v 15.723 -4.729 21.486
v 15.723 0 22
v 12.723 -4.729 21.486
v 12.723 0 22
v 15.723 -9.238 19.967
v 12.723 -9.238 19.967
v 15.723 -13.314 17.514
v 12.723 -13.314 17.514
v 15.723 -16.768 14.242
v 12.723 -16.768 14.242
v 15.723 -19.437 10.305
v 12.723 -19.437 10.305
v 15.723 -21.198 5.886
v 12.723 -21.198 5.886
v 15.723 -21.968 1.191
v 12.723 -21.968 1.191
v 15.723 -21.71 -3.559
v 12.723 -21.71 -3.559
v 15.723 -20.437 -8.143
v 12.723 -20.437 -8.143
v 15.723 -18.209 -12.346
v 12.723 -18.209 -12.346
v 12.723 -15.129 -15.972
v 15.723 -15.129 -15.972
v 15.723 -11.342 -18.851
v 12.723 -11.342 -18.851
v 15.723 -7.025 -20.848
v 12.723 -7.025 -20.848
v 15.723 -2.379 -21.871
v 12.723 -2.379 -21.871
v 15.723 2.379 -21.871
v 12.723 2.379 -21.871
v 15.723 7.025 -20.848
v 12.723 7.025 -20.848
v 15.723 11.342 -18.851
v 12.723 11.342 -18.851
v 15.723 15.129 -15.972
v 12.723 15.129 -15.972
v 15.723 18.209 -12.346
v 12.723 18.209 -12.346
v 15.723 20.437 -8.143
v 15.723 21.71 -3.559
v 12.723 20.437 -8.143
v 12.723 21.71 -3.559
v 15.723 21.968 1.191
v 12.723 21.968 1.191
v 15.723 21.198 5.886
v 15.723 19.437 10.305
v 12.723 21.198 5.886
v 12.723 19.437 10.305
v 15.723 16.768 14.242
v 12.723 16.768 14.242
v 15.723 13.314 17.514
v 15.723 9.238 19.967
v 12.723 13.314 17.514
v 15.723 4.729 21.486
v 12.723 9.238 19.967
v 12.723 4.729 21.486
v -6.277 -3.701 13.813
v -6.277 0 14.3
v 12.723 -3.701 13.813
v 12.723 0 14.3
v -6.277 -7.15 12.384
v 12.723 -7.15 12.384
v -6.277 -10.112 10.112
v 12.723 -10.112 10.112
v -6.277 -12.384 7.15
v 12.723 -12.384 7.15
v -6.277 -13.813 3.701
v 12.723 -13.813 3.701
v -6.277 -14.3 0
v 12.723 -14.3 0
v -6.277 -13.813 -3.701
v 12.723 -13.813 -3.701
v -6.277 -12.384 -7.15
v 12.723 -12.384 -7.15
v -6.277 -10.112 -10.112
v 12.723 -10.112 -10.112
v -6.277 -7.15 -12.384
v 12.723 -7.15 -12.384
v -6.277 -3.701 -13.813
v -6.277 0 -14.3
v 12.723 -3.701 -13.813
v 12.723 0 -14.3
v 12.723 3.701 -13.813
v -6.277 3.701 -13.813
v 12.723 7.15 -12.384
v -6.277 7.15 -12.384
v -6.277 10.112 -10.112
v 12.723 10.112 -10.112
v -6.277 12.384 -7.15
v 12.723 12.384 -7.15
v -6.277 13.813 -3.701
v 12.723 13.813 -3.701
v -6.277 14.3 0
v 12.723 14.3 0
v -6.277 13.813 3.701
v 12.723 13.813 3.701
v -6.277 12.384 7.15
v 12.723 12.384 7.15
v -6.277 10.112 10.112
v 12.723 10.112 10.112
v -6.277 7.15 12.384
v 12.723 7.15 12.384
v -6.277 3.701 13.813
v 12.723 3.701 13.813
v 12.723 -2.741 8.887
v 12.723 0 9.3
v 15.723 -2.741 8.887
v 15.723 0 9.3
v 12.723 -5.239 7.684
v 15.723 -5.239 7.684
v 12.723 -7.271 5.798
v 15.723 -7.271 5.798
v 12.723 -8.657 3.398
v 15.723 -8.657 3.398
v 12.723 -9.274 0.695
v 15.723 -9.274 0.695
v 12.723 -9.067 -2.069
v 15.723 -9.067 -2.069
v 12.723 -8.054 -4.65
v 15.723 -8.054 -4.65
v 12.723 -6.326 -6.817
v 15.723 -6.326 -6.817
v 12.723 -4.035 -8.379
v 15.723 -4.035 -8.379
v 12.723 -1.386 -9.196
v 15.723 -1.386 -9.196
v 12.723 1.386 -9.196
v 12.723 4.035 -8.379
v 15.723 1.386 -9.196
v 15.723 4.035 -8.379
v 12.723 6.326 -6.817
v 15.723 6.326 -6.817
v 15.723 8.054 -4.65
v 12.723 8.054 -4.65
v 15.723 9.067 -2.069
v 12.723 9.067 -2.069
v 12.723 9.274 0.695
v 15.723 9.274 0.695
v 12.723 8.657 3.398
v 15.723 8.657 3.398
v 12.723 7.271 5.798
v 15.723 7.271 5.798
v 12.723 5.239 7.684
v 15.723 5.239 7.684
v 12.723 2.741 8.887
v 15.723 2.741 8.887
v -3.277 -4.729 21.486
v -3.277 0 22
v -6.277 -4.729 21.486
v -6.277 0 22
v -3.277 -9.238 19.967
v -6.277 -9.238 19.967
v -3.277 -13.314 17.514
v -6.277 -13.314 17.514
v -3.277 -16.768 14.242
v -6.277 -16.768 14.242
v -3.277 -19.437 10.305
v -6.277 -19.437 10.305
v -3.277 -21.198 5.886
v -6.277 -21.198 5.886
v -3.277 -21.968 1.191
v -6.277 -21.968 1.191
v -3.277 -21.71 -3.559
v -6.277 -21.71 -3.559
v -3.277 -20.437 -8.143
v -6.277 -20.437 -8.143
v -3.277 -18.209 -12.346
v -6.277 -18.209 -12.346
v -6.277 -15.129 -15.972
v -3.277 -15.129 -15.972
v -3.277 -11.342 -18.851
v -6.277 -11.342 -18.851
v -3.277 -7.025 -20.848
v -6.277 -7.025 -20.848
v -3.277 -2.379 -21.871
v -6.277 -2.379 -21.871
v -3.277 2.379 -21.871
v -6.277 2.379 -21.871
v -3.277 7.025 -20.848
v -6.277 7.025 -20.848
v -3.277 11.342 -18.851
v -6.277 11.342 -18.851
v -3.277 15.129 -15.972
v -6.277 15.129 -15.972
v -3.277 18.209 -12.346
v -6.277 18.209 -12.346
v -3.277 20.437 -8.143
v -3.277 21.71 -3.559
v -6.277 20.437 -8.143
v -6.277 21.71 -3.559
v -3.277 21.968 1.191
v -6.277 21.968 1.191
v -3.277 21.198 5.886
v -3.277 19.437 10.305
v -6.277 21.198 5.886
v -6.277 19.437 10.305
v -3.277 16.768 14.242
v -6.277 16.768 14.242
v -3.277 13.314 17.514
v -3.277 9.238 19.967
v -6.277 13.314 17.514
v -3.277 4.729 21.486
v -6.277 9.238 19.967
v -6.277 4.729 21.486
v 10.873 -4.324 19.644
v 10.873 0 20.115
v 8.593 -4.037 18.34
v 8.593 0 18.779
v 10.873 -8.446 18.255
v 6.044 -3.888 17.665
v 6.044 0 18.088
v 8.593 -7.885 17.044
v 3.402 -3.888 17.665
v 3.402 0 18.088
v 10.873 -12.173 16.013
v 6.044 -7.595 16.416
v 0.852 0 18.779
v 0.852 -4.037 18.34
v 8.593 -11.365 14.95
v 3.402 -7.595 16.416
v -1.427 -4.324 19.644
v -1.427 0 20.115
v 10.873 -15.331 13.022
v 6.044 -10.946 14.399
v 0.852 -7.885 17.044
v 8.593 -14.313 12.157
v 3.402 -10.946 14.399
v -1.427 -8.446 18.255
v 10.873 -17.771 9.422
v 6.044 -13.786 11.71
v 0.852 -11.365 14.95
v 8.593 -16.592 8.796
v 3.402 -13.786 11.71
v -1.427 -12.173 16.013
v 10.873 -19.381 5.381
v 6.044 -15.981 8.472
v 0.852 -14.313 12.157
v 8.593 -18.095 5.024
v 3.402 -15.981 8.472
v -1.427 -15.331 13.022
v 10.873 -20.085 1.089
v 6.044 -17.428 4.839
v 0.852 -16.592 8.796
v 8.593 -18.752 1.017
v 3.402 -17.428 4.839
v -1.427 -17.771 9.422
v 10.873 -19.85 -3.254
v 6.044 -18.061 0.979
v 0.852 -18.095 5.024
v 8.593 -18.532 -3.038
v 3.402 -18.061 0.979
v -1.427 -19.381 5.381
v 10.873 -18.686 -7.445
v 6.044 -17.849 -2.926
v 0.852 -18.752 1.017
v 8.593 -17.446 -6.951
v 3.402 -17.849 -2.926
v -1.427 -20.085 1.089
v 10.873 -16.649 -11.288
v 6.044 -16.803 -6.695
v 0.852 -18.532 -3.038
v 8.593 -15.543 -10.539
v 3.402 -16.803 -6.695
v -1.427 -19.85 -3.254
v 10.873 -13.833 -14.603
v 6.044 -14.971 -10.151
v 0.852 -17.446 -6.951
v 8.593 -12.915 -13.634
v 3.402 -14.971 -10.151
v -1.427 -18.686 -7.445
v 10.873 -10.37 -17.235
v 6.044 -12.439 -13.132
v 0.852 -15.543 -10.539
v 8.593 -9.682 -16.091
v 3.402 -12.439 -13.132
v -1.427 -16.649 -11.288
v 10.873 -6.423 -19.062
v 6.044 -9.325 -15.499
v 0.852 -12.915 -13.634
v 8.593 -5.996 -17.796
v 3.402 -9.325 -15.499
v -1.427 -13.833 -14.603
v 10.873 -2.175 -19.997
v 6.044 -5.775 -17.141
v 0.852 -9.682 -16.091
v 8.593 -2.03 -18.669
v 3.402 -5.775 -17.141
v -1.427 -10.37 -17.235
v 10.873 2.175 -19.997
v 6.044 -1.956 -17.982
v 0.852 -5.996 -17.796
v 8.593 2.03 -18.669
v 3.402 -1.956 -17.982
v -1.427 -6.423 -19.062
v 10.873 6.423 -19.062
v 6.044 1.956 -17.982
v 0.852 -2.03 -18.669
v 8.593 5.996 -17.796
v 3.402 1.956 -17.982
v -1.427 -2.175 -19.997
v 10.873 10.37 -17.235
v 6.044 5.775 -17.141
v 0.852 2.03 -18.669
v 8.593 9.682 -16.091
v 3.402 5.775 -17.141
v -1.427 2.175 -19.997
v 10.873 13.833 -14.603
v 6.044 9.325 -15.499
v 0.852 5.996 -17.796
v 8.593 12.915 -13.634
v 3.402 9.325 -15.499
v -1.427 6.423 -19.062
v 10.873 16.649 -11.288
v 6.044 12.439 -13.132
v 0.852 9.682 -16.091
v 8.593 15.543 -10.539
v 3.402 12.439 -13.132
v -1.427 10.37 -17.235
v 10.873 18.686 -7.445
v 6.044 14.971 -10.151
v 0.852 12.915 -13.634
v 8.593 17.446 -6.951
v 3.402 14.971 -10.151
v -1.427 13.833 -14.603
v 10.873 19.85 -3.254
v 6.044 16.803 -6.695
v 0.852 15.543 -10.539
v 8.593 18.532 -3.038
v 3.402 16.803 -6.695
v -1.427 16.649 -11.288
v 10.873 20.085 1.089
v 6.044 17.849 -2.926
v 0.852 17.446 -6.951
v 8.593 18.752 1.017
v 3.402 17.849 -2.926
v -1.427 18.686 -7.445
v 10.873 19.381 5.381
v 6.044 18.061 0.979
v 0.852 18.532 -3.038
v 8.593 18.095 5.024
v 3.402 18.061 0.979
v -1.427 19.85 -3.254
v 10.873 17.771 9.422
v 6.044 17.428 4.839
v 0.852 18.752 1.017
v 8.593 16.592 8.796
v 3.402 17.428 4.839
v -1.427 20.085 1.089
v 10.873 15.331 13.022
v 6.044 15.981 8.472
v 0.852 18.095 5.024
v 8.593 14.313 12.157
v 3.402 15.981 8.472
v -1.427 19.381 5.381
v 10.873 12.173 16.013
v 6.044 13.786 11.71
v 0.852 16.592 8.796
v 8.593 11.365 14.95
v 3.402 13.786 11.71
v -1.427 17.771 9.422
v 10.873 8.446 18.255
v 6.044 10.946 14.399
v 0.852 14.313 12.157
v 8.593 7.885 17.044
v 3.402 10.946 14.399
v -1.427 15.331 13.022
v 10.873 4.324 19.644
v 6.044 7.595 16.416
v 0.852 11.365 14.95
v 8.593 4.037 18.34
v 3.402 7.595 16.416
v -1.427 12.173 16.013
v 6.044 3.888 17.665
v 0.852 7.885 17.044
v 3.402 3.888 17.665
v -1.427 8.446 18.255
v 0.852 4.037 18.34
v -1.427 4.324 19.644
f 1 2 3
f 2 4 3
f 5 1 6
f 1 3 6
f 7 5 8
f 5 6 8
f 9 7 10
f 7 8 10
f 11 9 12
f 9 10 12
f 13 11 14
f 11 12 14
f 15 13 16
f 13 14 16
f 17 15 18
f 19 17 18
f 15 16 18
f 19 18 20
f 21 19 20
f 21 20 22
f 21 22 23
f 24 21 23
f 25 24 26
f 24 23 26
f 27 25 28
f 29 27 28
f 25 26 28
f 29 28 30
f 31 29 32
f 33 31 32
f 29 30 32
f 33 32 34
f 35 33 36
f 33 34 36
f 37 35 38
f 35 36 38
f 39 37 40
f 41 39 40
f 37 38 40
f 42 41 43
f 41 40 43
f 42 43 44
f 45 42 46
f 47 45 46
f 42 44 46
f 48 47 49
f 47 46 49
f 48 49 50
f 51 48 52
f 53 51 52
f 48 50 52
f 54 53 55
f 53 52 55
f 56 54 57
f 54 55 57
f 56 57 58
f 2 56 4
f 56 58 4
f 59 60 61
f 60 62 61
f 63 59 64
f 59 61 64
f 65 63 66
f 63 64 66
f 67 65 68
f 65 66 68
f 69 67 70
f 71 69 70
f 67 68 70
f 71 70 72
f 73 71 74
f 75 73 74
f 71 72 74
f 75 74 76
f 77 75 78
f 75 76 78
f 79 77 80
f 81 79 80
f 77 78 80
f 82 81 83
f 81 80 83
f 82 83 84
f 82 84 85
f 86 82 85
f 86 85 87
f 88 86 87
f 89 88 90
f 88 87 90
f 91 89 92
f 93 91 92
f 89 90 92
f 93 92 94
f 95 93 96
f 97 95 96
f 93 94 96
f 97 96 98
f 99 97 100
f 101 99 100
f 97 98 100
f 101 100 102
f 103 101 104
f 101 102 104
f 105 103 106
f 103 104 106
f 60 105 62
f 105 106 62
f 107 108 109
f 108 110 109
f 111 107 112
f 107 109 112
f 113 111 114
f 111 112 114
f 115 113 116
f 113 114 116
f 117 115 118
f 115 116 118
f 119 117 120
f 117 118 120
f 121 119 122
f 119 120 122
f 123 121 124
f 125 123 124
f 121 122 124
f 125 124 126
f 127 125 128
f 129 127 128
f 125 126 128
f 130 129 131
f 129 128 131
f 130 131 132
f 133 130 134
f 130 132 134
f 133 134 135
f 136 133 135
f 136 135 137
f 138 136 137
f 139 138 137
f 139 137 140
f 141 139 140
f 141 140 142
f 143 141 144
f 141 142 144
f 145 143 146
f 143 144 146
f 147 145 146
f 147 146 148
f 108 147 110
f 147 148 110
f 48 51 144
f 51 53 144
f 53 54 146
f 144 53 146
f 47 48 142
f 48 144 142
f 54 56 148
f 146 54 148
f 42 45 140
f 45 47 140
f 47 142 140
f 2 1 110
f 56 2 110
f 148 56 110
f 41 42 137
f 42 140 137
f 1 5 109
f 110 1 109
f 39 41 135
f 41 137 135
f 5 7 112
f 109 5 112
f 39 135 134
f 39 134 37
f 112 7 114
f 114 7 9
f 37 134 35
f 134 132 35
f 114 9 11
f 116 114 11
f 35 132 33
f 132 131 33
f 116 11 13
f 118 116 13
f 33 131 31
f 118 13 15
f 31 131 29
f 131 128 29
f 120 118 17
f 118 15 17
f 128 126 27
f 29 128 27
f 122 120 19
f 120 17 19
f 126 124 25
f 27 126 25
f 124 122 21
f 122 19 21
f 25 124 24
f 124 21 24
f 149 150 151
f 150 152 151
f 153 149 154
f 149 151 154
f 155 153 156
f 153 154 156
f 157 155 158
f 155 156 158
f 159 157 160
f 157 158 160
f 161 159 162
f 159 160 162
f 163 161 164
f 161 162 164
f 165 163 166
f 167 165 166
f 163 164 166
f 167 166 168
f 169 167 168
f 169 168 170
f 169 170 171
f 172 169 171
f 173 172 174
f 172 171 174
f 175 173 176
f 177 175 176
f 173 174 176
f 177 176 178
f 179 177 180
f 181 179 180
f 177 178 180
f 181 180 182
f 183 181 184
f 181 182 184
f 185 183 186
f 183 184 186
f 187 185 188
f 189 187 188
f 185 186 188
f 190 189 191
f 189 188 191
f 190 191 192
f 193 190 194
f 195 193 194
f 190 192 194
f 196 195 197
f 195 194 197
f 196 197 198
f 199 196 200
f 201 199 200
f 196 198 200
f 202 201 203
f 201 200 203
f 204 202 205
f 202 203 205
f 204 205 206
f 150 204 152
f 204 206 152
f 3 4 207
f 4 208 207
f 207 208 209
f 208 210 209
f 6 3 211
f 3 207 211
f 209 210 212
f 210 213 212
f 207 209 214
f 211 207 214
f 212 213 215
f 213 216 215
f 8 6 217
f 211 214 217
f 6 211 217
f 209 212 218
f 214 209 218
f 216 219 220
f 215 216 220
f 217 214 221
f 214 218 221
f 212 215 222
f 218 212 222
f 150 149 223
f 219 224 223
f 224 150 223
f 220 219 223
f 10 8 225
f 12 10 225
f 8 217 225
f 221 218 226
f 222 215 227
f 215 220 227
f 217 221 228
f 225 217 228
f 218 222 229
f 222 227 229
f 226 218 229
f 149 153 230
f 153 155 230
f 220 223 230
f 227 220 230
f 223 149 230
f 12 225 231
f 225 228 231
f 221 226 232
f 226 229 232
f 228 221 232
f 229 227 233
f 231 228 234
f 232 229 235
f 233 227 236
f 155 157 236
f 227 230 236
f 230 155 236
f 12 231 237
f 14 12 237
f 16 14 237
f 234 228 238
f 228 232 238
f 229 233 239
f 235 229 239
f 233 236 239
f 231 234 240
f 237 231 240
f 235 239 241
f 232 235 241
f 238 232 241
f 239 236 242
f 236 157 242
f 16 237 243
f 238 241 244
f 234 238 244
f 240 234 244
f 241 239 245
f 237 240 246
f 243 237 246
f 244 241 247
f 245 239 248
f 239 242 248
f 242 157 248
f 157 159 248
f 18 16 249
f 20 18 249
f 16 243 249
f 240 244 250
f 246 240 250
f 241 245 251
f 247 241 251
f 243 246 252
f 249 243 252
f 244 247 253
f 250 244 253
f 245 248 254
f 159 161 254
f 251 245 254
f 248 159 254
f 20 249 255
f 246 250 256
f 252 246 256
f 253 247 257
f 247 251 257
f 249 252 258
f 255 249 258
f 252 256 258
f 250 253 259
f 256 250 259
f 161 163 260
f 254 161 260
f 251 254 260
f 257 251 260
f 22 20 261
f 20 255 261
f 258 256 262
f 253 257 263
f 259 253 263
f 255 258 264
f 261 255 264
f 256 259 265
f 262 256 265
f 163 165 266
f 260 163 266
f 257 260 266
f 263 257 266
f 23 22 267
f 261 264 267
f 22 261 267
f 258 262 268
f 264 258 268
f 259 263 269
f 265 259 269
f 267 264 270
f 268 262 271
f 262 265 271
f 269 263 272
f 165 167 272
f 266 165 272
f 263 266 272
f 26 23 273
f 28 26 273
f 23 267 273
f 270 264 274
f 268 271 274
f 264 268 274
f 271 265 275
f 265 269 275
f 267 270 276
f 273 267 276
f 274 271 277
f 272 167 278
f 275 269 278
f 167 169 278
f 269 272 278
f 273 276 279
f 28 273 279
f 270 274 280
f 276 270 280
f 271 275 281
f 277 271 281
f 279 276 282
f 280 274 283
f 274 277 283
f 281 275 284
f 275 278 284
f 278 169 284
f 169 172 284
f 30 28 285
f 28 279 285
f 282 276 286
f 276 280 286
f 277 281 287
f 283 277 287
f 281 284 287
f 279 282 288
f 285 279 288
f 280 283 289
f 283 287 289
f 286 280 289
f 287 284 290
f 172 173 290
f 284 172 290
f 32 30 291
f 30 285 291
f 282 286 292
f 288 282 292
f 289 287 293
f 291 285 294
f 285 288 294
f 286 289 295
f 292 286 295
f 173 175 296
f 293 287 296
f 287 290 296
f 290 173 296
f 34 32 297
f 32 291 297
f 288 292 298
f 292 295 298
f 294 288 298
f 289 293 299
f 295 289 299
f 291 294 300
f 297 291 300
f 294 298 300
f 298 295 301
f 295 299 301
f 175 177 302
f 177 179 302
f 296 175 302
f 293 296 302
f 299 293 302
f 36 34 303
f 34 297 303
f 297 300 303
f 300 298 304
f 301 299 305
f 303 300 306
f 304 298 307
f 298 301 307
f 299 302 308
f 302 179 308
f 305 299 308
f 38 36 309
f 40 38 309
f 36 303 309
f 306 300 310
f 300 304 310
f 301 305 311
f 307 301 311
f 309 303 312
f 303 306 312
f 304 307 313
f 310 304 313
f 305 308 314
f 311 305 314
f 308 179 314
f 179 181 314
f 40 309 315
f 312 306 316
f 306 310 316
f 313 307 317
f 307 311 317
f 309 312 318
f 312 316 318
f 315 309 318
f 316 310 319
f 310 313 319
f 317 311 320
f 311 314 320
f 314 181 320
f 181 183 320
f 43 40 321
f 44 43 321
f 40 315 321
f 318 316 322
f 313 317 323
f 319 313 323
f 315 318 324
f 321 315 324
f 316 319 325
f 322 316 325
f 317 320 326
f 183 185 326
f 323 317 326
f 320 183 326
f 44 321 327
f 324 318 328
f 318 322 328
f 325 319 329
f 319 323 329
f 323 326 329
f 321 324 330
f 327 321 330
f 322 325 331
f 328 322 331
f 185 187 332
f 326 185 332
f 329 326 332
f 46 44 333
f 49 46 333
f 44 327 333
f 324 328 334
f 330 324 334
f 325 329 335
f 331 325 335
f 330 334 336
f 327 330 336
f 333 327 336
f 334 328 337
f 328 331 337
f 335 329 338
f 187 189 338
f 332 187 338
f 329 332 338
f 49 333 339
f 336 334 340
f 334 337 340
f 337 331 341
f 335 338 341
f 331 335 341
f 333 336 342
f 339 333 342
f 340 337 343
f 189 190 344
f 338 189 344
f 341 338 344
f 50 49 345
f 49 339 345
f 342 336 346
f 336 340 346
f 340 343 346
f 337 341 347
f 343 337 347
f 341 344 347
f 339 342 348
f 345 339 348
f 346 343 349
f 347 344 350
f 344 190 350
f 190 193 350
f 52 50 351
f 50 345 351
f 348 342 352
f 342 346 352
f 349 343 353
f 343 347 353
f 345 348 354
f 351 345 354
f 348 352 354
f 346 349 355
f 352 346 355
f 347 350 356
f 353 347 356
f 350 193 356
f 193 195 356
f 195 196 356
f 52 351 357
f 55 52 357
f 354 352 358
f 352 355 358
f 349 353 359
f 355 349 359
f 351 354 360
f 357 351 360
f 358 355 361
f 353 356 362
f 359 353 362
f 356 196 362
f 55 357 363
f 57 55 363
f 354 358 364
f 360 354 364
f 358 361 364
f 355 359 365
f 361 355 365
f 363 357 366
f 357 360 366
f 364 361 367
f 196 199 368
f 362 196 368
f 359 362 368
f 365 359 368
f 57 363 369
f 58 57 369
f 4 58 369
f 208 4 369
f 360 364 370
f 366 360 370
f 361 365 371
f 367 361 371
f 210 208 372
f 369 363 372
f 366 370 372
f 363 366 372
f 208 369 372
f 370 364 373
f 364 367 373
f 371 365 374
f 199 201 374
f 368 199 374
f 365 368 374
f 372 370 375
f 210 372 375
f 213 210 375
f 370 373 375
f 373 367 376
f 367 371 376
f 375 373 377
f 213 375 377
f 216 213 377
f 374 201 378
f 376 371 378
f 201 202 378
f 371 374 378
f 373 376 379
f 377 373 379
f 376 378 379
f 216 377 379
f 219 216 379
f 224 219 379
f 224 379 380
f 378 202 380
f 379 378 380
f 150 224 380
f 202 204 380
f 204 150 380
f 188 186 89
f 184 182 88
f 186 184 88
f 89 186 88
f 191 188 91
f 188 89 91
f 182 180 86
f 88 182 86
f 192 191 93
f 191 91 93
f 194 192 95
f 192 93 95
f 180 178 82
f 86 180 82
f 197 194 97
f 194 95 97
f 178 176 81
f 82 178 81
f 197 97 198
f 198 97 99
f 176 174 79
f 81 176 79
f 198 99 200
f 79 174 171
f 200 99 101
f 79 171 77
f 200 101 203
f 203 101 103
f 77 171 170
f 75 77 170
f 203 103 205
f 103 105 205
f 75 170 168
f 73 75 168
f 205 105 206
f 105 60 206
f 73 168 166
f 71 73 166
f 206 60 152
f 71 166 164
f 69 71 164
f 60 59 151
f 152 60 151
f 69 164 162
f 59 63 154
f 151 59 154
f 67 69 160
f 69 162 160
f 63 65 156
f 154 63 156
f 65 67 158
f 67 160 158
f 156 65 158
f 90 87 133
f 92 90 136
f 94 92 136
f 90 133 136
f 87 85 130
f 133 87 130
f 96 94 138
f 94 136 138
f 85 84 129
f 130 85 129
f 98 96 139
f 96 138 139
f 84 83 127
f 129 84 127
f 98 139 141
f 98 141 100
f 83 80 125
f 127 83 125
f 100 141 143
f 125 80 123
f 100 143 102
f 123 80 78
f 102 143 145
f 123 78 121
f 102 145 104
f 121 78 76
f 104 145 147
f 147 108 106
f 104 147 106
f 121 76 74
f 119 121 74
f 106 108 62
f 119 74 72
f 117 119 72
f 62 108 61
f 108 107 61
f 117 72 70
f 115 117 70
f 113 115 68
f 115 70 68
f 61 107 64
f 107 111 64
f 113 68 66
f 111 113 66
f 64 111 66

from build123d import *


with BuildPart() as f1:
    # F0 (on Front) → F1 (revolve)
    with BuildSketch(Plane.XZ):
        with BuildLine():
            Line((-6.277208, 22), (-6.277208, 14.3))
            Line((-6.277208, 14.3), (12.722792, 14.3))
            Line((12.722792, 14.3), (12.722792, 9.3))
            Line((12.722792, 9.3), (15.722792, 9.3))
            Line((15.722792, 9.3), (15.722792, 22))
            Line((15.722792, 22), (12.722792, 22))
            ThreePointArc((12.722792, 22), (4.722792, 18), (-3.277208, 22))
            Line((-3.277208, 22), (-6.277208, 22))
        make_face()
    revolve(axis=Axis((-0.613183, 0, 0), (1, 0, 0)))


solid = f1.part
